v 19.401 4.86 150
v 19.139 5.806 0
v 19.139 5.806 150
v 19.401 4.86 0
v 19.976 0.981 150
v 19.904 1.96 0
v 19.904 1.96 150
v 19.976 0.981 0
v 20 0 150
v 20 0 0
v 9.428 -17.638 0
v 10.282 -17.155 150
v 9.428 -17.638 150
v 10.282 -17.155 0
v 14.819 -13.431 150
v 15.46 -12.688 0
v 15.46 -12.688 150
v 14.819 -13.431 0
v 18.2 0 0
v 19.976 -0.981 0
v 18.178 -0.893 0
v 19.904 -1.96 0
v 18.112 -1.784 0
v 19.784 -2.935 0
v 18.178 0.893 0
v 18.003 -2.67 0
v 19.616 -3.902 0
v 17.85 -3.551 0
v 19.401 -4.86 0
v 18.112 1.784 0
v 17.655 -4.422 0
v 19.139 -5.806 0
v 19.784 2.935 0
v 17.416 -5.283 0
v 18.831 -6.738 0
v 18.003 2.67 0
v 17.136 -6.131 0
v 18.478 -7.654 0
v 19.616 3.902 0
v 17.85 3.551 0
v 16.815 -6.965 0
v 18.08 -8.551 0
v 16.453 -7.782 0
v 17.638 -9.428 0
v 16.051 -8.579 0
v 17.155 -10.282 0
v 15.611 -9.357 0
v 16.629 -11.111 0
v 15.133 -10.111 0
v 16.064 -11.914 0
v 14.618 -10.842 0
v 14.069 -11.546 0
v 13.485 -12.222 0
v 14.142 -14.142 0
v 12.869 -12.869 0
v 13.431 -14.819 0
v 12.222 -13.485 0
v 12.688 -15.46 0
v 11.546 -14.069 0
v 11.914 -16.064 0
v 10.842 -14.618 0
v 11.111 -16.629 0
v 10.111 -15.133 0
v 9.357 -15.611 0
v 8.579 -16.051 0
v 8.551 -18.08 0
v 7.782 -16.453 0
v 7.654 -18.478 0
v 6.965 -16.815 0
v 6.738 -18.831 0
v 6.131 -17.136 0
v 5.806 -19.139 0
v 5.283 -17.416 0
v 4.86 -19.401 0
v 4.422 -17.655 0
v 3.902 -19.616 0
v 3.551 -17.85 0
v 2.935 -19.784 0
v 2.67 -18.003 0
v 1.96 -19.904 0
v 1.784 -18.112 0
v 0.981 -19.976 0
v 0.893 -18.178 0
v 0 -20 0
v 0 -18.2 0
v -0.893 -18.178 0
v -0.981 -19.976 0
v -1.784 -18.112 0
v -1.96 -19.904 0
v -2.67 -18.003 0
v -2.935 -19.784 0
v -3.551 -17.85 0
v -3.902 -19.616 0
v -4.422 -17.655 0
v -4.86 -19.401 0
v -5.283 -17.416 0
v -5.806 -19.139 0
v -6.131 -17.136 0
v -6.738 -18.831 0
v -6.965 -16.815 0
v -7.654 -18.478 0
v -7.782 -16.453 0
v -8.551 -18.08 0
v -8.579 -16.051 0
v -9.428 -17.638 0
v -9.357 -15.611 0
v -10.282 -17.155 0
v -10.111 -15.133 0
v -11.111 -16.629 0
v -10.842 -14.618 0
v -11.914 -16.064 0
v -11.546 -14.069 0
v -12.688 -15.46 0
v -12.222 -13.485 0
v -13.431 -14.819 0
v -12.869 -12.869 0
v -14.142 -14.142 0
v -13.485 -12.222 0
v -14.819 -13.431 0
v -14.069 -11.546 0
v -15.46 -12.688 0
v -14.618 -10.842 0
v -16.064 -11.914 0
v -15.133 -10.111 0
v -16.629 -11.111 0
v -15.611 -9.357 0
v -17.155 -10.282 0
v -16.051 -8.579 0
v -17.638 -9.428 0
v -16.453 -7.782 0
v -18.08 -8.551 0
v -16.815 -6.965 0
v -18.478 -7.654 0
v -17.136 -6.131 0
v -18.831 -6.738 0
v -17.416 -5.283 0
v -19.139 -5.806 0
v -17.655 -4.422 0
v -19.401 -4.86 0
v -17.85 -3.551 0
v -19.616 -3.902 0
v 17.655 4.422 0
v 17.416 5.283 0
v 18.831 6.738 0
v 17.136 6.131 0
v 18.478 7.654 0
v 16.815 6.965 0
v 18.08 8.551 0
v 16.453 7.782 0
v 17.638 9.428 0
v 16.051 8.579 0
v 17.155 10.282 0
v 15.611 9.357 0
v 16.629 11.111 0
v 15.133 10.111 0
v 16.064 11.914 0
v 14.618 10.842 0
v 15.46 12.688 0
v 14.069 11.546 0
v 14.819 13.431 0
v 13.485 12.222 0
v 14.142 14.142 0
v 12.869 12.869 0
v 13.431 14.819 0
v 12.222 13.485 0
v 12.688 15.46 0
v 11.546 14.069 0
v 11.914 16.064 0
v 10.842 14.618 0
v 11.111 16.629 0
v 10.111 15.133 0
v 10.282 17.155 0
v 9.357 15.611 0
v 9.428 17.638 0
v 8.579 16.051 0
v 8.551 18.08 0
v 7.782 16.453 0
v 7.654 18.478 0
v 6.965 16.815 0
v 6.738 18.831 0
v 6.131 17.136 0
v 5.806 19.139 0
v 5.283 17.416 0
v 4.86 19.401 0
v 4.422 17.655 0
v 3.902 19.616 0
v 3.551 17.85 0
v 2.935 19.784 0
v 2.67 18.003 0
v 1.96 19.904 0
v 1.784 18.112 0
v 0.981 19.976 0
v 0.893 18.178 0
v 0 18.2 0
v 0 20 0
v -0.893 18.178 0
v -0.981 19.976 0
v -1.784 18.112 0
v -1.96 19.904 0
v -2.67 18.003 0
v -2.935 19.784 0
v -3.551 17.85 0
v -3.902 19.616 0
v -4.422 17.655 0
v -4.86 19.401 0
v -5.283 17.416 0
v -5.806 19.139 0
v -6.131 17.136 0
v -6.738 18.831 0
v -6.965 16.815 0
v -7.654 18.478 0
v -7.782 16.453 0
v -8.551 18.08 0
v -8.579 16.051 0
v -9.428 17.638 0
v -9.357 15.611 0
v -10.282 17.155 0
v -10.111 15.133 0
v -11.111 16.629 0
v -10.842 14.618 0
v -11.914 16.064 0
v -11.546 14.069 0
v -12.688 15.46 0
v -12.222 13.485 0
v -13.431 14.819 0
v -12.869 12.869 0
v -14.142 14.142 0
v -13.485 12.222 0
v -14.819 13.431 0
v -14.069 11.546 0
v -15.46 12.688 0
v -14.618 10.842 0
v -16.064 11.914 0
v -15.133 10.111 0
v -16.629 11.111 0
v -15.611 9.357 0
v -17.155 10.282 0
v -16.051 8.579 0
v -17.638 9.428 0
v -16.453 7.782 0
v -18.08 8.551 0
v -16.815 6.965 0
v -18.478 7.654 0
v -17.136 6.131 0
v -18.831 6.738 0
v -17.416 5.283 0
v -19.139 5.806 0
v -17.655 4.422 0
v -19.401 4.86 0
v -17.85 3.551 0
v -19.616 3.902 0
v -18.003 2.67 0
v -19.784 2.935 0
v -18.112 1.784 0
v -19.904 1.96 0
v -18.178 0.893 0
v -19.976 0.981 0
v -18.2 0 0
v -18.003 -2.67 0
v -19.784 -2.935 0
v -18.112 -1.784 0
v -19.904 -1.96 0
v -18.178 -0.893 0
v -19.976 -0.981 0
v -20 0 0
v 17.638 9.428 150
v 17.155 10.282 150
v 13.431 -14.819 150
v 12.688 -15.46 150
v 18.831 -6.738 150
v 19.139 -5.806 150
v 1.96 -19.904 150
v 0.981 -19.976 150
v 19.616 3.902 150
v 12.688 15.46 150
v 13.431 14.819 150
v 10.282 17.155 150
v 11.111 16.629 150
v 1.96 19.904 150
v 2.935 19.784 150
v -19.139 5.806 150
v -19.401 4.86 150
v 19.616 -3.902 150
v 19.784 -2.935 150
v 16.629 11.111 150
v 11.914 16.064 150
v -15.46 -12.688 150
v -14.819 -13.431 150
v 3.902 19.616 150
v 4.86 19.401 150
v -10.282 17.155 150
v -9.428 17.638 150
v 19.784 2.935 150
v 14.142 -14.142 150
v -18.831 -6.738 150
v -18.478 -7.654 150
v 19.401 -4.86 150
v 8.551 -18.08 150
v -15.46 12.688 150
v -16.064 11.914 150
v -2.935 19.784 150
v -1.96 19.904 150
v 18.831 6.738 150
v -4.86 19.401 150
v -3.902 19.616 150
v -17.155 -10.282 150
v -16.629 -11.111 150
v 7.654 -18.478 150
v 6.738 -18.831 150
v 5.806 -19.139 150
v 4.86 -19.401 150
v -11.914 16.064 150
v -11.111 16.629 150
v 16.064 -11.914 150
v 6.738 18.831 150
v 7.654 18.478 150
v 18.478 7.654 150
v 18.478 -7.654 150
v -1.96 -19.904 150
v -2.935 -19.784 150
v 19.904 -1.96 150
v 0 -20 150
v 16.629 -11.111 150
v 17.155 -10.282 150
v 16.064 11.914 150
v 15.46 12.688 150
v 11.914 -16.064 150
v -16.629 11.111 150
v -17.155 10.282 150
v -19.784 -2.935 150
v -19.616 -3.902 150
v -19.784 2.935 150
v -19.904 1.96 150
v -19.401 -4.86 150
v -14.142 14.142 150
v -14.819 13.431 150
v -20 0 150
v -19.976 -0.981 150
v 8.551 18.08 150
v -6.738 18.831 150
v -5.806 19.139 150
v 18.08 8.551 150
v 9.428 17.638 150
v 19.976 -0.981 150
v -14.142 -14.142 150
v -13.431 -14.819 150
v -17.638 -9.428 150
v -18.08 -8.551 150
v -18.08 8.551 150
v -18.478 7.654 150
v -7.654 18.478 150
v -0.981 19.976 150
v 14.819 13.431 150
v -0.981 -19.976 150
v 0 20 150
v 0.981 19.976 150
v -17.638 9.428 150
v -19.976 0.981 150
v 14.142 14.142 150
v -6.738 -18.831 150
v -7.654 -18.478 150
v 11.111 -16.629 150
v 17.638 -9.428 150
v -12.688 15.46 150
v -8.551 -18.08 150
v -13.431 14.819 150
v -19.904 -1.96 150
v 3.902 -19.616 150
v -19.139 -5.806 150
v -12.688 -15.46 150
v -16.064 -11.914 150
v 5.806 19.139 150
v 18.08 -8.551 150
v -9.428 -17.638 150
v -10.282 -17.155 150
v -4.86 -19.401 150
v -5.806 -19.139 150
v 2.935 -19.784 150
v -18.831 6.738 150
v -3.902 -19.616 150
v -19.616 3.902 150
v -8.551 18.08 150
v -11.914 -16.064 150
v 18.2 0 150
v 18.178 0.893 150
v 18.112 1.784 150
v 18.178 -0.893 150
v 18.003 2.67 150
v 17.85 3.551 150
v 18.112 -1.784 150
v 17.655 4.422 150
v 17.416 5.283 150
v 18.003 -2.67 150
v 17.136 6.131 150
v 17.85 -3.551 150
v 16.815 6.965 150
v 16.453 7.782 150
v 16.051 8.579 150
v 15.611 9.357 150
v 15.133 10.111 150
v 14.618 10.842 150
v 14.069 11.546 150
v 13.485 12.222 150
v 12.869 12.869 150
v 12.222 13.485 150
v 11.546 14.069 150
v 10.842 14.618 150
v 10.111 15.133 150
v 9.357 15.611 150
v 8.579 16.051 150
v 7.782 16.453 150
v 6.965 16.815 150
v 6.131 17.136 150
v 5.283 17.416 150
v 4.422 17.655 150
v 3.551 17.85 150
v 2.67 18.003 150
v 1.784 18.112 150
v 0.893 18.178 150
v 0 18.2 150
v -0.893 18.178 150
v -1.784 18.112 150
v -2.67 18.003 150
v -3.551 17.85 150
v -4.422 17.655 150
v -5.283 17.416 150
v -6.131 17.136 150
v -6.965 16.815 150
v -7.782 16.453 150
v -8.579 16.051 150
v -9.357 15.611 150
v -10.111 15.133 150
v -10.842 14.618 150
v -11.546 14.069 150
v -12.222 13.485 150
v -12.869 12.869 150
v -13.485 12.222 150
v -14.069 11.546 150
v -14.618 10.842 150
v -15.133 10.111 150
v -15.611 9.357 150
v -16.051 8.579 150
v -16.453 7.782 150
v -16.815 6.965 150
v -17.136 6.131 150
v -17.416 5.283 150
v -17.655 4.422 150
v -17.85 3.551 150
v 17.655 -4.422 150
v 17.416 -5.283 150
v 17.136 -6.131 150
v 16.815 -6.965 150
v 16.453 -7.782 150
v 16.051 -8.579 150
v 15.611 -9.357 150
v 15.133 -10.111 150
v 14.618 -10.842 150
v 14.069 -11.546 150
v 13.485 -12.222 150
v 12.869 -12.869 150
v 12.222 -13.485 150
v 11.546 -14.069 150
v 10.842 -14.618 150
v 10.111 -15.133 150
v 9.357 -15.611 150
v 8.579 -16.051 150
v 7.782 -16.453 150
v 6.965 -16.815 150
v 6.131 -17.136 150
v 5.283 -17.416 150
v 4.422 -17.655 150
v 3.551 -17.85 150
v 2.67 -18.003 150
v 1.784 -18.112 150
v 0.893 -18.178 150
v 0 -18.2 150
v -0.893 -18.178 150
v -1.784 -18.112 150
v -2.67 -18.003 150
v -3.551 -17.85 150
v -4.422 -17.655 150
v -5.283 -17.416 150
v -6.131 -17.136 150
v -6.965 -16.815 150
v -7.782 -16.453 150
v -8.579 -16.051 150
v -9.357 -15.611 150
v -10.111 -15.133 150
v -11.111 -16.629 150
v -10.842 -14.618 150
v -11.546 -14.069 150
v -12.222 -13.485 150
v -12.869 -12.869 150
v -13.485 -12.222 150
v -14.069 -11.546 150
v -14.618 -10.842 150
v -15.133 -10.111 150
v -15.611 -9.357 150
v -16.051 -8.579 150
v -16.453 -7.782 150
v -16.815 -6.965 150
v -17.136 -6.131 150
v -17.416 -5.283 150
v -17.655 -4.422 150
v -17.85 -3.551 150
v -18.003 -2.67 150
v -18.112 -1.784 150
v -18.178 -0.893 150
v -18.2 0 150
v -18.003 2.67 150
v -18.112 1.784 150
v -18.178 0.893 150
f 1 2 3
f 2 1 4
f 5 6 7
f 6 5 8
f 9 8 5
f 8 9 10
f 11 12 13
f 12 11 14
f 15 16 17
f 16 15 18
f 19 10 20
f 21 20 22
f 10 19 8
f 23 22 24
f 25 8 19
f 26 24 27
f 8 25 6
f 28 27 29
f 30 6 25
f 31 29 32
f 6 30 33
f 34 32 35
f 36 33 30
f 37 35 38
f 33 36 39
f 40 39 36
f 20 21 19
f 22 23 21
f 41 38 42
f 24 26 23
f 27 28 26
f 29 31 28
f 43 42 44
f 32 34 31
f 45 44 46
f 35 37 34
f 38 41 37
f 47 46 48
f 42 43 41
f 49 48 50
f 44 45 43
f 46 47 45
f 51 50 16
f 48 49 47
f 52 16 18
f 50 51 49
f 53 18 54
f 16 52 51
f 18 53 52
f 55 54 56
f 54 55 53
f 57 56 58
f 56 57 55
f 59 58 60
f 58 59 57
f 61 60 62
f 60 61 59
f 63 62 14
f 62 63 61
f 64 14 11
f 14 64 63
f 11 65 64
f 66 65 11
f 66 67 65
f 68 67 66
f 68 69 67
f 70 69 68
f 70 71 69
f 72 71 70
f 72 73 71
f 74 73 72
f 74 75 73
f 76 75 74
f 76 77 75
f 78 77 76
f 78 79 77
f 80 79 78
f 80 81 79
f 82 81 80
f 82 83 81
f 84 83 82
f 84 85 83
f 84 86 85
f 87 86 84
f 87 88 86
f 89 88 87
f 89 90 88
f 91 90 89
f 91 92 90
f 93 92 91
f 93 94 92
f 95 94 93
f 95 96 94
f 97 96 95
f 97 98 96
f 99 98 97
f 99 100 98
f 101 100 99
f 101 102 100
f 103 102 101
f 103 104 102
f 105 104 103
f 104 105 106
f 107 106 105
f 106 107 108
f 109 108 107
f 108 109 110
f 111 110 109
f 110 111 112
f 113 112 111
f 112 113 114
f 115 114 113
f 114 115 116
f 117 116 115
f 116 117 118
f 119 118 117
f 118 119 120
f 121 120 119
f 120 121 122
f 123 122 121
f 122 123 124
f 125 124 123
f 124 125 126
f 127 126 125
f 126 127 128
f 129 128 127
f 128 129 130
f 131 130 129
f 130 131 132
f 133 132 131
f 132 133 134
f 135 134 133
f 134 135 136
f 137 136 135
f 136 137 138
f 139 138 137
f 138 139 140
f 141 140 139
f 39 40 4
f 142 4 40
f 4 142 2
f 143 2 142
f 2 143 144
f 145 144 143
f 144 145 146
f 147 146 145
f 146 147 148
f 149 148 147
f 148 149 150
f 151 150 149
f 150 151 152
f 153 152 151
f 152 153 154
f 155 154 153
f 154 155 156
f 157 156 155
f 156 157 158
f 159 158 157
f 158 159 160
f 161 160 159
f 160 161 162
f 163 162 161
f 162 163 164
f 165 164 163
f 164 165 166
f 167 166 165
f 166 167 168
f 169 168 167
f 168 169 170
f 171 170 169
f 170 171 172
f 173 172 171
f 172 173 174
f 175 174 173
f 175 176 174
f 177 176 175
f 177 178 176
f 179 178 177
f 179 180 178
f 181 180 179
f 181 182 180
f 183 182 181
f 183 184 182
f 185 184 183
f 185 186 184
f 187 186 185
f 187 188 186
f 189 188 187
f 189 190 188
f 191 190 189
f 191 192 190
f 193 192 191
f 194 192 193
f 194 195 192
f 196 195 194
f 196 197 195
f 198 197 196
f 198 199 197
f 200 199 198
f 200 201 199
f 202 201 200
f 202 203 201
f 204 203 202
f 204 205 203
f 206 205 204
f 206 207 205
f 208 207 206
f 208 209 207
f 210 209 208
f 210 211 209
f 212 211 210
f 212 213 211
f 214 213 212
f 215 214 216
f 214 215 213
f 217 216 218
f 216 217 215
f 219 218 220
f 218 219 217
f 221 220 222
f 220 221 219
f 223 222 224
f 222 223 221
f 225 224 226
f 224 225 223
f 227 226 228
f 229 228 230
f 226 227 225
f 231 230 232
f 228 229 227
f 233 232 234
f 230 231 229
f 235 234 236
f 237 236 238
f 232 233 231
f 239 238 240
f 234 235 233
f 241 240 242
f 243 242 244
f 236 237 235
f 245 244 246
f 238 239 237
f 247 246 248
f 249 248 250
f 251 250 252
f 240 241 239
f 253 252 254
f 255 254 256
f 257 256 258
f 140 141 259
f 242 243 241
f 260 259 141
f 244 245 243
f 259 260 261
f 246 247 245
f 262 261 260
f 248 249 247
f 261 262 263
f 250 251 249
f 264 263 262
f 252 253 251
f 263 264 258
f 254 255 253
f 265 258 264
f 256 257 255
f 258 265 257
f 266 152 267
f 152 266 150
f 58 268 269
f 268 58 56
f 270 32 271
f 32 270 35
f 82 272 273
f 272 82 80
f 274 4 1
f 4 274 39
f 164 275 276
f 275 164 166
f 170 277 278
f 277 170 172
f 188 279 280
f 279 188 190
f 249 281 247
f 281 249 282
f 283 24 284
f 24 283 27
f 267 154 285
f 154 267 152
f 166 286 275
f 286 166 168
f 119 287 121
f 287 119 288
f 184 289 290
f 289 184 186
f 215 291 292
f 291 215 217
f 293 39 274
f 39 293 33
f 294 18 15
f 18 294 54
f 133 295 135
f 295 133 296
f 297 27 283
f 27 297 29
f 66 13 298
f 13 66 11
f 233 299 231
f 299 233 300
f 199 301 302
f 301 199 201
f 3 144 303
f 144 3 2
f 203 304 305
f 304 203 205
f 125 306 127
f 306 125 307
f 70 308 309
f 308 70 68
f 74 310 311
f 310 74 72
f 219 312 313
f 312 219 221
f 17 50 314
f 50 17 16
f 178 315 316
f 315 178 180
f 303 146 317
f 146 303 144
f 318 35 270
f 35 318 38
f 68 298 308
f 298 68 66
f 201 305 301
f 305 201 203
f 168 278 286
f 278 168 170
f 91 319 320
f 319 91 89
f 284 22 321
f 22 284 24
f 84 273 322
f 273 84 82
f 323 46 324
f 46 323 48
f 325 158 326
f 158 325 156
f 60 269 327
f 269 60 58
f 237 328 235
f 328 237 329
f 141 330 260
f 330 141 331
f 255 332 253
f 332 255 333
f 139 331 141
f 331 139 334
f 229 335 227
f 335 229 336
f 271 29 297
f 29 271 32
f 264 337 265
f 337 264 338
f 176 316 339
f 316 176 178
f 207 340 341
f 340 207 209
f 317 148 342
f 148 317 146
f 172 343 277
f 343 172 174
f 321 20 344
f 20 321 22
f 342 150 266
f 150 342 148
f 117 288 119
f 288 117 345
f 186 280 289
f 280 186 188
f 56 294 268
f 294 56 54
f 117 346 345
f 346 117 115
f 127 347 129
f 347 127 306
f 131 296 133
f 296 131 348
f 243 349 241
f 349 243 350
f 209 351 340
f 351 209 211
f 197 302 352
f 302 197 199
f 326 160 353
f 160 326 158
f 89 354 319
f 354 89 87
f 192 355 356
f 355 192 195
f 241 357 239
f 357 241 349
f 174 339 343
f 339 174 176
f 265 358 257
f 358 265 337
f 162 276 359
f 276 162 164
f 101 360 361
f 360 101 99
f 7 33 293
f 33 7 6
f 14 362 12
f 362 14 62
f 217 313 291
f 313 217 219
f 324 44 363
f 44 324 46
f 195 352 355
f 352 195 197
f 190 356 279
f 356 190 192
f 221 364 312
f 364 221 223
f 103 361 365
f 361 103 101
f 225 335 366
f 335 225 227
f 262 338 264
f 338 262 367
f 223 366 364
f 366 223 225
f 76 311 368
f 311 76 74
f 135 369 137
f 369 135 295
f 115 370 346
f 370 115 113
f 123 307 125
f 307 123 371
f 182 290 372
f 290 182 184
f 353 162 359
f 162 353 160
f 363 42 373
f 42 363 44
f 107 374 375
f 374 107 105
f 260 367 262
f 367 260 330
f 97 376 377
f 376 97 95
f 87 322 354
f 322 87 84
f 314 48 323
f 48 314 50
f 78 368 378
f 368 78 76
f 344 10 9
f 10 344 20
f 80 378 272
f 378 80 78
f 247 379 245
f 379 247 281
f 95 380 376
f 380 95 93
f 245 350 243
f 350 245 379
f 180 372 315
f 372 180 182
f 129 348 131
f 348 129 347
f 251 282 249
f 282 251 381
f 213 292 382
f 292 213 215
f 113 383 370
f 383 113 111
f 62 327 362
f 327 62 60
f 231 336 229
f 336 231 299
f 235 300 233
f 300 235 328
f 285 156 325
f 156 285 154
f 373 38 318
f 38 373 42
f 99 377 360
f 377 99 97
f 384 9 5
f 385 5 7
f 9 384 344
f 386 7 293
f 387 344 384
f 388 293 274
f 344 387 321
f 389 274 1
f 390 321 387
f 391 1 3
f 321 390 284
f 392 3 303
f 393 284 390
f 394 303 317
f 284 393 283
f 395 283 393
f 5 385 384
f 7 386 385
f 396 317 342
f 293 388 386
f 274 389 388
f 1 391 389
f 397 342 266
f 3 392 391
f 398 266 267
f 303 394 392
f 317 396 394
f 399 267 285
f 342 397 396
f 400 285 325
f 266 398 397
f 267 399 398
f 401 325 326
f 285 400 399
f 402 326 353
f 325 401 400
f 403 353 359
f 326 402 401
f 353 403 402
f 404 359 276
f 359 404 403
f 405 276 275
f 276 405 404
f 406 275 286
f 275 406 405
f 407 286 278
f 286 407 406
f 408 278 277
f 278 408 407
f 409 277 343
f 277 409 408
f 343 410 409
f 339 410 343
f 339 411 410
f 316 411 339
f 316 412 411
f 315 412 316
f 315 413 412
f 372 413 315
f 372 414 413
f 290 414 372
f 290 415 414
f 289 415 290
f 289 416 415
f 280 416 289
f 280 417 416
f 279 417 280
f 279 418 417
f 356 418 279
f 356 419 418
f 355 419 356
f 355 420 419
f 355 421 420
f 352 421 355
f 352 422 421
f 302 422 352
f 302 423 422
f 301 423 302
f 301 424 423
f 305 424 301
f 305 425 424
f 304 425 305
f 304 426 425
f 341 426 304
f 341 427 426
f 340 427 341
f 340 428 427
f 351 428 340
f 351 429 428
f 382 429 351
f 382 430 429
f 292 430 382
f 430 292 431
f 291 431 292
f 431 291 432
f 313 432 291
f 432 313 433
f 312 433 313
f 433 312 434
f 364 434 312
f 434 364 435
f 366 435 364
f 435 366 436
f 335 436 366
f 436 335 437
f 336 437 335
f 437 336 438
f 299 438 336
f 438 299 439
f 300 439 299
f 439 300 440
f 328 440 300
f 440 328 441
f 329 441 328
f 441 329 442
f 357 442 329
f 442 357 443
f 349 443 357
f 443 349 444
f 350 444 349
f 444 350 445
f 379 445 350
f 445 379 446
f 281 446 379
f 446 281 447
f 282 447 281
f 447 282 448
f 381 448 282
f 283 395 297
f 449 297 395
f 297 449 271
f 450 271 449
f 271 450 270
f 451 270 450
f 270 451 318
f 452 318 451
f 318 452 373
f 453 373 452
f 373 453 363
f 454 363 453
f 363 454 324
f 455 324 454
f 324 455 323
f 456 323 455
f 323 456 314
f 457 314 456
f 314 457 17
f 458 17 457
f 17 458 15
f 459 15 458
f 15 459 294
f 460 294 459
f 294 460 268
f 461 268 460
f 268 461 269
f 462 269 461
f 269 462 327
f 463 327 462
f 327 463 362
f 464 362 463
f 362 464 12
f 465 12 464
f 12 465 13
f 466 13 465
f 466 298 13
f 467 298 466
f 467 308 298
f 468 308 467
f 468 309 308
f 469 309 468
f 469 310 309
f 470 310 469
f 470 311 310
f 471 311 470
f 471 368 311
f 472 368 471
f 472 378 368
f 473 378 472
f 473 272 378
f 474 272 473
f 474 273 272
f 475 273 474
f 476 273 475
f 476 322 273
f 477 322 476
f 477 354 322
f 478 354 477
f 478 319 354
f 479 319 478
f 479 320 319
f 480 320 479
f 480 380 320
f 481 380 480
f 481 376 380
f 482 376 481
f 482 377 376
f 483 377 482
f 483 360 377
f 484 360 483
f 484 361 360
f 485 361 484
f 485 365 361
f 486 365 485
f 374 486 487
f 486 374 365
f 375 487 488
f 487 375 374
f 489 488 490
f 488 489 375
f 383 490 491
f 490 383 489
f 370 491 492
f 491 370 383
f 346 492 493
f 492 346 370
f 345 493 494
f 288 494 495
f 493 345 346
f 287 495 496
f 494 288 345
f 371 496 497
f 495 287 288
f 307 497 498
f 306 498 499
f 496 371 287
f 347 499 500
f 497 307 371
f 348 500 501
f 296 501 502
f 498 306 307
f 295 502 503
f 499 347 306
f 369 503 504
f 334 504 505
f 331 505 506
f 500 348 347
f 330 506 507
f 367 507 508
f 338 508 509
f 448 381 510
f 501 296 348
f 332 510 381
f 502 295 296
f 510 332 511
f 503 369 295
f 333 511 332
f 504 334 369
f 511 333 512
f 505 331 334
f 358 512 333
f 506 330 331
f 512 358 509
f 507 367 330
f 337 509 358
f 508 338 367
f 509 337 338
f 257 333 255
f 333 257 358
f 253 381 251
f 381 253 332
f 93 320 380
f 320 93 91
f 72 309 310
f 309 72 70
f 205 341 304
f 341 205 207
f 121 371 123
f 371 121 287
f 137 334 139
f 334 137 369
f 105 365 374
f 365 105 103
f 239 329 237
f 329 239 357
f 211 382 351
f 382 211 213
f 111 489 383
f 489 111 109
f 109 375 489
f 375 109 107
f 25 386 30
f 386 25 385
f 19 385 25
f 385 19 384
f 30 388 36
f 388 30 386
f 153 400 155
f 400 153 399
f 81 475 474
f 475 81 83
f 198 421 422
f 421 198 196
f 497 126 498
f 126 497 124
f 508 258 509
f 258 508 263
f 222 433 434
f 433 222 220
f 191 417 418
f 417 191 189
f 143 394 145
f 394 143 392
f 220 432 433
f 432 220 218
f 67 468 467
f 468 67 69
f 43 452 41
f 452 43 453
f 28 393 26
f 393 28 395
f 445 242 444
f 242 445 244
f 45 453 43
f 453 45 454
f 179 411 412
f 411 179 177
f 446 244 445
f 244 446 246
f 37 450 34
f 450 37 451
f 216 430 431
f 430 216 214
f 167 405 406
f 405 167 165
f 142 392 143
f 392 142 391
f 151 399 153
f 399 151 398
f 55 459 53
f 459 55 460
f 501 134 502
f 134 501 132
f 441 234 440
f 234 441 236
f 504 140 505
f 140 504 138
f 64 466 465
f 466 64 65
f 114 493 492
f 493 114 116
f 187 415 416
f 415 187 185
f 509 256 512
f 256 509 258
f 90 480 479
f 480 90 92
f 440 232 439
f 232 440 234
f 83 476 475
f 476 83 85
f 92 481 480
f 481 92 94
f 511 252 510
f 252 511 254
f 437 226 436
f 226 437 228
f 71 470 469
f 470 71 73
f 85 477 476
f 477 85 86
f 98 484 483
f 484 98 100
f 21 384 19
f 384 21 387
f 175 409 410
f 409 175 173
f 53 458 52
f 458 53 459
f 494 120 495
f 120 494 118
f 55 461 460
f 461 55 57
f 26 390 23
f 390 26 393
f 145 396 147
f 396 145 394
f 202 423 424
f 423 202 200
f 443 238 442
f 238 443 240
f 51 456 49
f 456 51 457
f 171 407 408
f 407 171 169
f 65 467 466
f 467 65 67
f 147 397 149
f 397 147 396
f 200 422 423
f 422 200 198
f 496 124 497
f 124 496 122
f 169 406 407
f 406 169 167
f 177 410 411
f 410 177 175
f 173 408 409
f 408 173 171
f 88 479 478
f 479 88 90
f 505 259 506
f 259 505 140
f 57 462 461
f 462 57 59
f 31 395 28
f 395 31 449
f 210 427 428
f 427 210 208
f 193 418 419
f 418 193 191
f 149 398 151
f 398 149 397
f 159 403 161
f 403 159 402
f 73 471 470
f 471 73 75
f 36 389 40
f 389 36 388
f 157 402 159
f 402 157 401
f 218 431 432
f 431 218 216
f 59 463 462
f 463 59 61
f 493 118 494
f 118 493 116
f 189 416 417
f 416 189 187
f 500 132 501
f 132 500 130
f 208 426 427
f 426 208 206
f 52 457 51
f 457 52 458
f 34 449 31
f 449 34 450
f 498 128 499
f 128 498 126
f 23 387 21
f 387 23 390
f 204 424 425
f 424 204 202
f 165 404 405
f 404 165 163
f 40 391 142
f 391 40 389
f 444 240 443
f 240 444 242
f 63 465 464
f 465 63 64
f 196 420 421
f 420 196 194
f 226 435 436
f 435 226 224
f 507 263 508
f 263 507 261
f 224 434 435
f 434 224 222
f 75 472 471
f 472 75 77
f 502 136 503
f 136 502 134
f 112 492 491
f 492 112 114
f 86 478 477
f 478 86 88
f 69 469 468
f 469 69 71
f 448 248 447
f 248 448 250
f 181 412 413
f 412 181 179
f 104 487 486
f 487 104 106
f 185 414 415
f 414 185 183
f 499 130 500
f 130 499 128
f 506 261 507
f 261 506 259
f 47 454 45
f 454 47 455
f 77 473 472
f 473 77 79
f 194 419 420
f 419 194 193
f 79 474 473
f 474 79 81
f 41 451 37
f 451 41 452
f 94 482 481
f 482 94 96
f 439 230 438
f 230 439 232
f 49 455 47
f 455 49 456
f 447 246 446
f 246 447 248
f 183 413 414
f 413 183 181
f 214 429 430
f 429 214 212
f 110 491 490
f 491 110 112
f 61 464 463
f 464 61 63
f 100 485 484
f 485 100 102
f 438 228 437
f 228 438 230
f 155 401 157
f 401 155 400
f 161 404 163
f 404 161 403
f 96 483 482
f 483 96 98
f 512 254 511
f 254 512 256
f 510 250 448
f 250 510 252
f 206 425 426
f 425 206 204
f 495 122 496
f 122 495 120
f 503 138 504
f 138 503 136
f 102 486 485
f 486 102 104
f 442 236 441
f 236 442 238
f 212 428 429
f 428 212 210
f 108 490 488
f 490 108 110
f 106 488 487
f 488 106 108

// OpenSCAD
$fn = 128;

// HT 40 pipe (approx.): DN40, OD 40 mm, length 150 mm
// Typical wall thickness for HT40 is ~1.8 mm (varies by manufacturer).
// Adjust wall_thickness if needed.
od = 40;
wall_thickness = 1.8;
id = od - 2*wall_thickness;
length = 150;

difference() {
  cylinder(h = length, d = od);
  translate([0,0,-0.1]) cylinder(h = length + 0.2, d = id);
}
